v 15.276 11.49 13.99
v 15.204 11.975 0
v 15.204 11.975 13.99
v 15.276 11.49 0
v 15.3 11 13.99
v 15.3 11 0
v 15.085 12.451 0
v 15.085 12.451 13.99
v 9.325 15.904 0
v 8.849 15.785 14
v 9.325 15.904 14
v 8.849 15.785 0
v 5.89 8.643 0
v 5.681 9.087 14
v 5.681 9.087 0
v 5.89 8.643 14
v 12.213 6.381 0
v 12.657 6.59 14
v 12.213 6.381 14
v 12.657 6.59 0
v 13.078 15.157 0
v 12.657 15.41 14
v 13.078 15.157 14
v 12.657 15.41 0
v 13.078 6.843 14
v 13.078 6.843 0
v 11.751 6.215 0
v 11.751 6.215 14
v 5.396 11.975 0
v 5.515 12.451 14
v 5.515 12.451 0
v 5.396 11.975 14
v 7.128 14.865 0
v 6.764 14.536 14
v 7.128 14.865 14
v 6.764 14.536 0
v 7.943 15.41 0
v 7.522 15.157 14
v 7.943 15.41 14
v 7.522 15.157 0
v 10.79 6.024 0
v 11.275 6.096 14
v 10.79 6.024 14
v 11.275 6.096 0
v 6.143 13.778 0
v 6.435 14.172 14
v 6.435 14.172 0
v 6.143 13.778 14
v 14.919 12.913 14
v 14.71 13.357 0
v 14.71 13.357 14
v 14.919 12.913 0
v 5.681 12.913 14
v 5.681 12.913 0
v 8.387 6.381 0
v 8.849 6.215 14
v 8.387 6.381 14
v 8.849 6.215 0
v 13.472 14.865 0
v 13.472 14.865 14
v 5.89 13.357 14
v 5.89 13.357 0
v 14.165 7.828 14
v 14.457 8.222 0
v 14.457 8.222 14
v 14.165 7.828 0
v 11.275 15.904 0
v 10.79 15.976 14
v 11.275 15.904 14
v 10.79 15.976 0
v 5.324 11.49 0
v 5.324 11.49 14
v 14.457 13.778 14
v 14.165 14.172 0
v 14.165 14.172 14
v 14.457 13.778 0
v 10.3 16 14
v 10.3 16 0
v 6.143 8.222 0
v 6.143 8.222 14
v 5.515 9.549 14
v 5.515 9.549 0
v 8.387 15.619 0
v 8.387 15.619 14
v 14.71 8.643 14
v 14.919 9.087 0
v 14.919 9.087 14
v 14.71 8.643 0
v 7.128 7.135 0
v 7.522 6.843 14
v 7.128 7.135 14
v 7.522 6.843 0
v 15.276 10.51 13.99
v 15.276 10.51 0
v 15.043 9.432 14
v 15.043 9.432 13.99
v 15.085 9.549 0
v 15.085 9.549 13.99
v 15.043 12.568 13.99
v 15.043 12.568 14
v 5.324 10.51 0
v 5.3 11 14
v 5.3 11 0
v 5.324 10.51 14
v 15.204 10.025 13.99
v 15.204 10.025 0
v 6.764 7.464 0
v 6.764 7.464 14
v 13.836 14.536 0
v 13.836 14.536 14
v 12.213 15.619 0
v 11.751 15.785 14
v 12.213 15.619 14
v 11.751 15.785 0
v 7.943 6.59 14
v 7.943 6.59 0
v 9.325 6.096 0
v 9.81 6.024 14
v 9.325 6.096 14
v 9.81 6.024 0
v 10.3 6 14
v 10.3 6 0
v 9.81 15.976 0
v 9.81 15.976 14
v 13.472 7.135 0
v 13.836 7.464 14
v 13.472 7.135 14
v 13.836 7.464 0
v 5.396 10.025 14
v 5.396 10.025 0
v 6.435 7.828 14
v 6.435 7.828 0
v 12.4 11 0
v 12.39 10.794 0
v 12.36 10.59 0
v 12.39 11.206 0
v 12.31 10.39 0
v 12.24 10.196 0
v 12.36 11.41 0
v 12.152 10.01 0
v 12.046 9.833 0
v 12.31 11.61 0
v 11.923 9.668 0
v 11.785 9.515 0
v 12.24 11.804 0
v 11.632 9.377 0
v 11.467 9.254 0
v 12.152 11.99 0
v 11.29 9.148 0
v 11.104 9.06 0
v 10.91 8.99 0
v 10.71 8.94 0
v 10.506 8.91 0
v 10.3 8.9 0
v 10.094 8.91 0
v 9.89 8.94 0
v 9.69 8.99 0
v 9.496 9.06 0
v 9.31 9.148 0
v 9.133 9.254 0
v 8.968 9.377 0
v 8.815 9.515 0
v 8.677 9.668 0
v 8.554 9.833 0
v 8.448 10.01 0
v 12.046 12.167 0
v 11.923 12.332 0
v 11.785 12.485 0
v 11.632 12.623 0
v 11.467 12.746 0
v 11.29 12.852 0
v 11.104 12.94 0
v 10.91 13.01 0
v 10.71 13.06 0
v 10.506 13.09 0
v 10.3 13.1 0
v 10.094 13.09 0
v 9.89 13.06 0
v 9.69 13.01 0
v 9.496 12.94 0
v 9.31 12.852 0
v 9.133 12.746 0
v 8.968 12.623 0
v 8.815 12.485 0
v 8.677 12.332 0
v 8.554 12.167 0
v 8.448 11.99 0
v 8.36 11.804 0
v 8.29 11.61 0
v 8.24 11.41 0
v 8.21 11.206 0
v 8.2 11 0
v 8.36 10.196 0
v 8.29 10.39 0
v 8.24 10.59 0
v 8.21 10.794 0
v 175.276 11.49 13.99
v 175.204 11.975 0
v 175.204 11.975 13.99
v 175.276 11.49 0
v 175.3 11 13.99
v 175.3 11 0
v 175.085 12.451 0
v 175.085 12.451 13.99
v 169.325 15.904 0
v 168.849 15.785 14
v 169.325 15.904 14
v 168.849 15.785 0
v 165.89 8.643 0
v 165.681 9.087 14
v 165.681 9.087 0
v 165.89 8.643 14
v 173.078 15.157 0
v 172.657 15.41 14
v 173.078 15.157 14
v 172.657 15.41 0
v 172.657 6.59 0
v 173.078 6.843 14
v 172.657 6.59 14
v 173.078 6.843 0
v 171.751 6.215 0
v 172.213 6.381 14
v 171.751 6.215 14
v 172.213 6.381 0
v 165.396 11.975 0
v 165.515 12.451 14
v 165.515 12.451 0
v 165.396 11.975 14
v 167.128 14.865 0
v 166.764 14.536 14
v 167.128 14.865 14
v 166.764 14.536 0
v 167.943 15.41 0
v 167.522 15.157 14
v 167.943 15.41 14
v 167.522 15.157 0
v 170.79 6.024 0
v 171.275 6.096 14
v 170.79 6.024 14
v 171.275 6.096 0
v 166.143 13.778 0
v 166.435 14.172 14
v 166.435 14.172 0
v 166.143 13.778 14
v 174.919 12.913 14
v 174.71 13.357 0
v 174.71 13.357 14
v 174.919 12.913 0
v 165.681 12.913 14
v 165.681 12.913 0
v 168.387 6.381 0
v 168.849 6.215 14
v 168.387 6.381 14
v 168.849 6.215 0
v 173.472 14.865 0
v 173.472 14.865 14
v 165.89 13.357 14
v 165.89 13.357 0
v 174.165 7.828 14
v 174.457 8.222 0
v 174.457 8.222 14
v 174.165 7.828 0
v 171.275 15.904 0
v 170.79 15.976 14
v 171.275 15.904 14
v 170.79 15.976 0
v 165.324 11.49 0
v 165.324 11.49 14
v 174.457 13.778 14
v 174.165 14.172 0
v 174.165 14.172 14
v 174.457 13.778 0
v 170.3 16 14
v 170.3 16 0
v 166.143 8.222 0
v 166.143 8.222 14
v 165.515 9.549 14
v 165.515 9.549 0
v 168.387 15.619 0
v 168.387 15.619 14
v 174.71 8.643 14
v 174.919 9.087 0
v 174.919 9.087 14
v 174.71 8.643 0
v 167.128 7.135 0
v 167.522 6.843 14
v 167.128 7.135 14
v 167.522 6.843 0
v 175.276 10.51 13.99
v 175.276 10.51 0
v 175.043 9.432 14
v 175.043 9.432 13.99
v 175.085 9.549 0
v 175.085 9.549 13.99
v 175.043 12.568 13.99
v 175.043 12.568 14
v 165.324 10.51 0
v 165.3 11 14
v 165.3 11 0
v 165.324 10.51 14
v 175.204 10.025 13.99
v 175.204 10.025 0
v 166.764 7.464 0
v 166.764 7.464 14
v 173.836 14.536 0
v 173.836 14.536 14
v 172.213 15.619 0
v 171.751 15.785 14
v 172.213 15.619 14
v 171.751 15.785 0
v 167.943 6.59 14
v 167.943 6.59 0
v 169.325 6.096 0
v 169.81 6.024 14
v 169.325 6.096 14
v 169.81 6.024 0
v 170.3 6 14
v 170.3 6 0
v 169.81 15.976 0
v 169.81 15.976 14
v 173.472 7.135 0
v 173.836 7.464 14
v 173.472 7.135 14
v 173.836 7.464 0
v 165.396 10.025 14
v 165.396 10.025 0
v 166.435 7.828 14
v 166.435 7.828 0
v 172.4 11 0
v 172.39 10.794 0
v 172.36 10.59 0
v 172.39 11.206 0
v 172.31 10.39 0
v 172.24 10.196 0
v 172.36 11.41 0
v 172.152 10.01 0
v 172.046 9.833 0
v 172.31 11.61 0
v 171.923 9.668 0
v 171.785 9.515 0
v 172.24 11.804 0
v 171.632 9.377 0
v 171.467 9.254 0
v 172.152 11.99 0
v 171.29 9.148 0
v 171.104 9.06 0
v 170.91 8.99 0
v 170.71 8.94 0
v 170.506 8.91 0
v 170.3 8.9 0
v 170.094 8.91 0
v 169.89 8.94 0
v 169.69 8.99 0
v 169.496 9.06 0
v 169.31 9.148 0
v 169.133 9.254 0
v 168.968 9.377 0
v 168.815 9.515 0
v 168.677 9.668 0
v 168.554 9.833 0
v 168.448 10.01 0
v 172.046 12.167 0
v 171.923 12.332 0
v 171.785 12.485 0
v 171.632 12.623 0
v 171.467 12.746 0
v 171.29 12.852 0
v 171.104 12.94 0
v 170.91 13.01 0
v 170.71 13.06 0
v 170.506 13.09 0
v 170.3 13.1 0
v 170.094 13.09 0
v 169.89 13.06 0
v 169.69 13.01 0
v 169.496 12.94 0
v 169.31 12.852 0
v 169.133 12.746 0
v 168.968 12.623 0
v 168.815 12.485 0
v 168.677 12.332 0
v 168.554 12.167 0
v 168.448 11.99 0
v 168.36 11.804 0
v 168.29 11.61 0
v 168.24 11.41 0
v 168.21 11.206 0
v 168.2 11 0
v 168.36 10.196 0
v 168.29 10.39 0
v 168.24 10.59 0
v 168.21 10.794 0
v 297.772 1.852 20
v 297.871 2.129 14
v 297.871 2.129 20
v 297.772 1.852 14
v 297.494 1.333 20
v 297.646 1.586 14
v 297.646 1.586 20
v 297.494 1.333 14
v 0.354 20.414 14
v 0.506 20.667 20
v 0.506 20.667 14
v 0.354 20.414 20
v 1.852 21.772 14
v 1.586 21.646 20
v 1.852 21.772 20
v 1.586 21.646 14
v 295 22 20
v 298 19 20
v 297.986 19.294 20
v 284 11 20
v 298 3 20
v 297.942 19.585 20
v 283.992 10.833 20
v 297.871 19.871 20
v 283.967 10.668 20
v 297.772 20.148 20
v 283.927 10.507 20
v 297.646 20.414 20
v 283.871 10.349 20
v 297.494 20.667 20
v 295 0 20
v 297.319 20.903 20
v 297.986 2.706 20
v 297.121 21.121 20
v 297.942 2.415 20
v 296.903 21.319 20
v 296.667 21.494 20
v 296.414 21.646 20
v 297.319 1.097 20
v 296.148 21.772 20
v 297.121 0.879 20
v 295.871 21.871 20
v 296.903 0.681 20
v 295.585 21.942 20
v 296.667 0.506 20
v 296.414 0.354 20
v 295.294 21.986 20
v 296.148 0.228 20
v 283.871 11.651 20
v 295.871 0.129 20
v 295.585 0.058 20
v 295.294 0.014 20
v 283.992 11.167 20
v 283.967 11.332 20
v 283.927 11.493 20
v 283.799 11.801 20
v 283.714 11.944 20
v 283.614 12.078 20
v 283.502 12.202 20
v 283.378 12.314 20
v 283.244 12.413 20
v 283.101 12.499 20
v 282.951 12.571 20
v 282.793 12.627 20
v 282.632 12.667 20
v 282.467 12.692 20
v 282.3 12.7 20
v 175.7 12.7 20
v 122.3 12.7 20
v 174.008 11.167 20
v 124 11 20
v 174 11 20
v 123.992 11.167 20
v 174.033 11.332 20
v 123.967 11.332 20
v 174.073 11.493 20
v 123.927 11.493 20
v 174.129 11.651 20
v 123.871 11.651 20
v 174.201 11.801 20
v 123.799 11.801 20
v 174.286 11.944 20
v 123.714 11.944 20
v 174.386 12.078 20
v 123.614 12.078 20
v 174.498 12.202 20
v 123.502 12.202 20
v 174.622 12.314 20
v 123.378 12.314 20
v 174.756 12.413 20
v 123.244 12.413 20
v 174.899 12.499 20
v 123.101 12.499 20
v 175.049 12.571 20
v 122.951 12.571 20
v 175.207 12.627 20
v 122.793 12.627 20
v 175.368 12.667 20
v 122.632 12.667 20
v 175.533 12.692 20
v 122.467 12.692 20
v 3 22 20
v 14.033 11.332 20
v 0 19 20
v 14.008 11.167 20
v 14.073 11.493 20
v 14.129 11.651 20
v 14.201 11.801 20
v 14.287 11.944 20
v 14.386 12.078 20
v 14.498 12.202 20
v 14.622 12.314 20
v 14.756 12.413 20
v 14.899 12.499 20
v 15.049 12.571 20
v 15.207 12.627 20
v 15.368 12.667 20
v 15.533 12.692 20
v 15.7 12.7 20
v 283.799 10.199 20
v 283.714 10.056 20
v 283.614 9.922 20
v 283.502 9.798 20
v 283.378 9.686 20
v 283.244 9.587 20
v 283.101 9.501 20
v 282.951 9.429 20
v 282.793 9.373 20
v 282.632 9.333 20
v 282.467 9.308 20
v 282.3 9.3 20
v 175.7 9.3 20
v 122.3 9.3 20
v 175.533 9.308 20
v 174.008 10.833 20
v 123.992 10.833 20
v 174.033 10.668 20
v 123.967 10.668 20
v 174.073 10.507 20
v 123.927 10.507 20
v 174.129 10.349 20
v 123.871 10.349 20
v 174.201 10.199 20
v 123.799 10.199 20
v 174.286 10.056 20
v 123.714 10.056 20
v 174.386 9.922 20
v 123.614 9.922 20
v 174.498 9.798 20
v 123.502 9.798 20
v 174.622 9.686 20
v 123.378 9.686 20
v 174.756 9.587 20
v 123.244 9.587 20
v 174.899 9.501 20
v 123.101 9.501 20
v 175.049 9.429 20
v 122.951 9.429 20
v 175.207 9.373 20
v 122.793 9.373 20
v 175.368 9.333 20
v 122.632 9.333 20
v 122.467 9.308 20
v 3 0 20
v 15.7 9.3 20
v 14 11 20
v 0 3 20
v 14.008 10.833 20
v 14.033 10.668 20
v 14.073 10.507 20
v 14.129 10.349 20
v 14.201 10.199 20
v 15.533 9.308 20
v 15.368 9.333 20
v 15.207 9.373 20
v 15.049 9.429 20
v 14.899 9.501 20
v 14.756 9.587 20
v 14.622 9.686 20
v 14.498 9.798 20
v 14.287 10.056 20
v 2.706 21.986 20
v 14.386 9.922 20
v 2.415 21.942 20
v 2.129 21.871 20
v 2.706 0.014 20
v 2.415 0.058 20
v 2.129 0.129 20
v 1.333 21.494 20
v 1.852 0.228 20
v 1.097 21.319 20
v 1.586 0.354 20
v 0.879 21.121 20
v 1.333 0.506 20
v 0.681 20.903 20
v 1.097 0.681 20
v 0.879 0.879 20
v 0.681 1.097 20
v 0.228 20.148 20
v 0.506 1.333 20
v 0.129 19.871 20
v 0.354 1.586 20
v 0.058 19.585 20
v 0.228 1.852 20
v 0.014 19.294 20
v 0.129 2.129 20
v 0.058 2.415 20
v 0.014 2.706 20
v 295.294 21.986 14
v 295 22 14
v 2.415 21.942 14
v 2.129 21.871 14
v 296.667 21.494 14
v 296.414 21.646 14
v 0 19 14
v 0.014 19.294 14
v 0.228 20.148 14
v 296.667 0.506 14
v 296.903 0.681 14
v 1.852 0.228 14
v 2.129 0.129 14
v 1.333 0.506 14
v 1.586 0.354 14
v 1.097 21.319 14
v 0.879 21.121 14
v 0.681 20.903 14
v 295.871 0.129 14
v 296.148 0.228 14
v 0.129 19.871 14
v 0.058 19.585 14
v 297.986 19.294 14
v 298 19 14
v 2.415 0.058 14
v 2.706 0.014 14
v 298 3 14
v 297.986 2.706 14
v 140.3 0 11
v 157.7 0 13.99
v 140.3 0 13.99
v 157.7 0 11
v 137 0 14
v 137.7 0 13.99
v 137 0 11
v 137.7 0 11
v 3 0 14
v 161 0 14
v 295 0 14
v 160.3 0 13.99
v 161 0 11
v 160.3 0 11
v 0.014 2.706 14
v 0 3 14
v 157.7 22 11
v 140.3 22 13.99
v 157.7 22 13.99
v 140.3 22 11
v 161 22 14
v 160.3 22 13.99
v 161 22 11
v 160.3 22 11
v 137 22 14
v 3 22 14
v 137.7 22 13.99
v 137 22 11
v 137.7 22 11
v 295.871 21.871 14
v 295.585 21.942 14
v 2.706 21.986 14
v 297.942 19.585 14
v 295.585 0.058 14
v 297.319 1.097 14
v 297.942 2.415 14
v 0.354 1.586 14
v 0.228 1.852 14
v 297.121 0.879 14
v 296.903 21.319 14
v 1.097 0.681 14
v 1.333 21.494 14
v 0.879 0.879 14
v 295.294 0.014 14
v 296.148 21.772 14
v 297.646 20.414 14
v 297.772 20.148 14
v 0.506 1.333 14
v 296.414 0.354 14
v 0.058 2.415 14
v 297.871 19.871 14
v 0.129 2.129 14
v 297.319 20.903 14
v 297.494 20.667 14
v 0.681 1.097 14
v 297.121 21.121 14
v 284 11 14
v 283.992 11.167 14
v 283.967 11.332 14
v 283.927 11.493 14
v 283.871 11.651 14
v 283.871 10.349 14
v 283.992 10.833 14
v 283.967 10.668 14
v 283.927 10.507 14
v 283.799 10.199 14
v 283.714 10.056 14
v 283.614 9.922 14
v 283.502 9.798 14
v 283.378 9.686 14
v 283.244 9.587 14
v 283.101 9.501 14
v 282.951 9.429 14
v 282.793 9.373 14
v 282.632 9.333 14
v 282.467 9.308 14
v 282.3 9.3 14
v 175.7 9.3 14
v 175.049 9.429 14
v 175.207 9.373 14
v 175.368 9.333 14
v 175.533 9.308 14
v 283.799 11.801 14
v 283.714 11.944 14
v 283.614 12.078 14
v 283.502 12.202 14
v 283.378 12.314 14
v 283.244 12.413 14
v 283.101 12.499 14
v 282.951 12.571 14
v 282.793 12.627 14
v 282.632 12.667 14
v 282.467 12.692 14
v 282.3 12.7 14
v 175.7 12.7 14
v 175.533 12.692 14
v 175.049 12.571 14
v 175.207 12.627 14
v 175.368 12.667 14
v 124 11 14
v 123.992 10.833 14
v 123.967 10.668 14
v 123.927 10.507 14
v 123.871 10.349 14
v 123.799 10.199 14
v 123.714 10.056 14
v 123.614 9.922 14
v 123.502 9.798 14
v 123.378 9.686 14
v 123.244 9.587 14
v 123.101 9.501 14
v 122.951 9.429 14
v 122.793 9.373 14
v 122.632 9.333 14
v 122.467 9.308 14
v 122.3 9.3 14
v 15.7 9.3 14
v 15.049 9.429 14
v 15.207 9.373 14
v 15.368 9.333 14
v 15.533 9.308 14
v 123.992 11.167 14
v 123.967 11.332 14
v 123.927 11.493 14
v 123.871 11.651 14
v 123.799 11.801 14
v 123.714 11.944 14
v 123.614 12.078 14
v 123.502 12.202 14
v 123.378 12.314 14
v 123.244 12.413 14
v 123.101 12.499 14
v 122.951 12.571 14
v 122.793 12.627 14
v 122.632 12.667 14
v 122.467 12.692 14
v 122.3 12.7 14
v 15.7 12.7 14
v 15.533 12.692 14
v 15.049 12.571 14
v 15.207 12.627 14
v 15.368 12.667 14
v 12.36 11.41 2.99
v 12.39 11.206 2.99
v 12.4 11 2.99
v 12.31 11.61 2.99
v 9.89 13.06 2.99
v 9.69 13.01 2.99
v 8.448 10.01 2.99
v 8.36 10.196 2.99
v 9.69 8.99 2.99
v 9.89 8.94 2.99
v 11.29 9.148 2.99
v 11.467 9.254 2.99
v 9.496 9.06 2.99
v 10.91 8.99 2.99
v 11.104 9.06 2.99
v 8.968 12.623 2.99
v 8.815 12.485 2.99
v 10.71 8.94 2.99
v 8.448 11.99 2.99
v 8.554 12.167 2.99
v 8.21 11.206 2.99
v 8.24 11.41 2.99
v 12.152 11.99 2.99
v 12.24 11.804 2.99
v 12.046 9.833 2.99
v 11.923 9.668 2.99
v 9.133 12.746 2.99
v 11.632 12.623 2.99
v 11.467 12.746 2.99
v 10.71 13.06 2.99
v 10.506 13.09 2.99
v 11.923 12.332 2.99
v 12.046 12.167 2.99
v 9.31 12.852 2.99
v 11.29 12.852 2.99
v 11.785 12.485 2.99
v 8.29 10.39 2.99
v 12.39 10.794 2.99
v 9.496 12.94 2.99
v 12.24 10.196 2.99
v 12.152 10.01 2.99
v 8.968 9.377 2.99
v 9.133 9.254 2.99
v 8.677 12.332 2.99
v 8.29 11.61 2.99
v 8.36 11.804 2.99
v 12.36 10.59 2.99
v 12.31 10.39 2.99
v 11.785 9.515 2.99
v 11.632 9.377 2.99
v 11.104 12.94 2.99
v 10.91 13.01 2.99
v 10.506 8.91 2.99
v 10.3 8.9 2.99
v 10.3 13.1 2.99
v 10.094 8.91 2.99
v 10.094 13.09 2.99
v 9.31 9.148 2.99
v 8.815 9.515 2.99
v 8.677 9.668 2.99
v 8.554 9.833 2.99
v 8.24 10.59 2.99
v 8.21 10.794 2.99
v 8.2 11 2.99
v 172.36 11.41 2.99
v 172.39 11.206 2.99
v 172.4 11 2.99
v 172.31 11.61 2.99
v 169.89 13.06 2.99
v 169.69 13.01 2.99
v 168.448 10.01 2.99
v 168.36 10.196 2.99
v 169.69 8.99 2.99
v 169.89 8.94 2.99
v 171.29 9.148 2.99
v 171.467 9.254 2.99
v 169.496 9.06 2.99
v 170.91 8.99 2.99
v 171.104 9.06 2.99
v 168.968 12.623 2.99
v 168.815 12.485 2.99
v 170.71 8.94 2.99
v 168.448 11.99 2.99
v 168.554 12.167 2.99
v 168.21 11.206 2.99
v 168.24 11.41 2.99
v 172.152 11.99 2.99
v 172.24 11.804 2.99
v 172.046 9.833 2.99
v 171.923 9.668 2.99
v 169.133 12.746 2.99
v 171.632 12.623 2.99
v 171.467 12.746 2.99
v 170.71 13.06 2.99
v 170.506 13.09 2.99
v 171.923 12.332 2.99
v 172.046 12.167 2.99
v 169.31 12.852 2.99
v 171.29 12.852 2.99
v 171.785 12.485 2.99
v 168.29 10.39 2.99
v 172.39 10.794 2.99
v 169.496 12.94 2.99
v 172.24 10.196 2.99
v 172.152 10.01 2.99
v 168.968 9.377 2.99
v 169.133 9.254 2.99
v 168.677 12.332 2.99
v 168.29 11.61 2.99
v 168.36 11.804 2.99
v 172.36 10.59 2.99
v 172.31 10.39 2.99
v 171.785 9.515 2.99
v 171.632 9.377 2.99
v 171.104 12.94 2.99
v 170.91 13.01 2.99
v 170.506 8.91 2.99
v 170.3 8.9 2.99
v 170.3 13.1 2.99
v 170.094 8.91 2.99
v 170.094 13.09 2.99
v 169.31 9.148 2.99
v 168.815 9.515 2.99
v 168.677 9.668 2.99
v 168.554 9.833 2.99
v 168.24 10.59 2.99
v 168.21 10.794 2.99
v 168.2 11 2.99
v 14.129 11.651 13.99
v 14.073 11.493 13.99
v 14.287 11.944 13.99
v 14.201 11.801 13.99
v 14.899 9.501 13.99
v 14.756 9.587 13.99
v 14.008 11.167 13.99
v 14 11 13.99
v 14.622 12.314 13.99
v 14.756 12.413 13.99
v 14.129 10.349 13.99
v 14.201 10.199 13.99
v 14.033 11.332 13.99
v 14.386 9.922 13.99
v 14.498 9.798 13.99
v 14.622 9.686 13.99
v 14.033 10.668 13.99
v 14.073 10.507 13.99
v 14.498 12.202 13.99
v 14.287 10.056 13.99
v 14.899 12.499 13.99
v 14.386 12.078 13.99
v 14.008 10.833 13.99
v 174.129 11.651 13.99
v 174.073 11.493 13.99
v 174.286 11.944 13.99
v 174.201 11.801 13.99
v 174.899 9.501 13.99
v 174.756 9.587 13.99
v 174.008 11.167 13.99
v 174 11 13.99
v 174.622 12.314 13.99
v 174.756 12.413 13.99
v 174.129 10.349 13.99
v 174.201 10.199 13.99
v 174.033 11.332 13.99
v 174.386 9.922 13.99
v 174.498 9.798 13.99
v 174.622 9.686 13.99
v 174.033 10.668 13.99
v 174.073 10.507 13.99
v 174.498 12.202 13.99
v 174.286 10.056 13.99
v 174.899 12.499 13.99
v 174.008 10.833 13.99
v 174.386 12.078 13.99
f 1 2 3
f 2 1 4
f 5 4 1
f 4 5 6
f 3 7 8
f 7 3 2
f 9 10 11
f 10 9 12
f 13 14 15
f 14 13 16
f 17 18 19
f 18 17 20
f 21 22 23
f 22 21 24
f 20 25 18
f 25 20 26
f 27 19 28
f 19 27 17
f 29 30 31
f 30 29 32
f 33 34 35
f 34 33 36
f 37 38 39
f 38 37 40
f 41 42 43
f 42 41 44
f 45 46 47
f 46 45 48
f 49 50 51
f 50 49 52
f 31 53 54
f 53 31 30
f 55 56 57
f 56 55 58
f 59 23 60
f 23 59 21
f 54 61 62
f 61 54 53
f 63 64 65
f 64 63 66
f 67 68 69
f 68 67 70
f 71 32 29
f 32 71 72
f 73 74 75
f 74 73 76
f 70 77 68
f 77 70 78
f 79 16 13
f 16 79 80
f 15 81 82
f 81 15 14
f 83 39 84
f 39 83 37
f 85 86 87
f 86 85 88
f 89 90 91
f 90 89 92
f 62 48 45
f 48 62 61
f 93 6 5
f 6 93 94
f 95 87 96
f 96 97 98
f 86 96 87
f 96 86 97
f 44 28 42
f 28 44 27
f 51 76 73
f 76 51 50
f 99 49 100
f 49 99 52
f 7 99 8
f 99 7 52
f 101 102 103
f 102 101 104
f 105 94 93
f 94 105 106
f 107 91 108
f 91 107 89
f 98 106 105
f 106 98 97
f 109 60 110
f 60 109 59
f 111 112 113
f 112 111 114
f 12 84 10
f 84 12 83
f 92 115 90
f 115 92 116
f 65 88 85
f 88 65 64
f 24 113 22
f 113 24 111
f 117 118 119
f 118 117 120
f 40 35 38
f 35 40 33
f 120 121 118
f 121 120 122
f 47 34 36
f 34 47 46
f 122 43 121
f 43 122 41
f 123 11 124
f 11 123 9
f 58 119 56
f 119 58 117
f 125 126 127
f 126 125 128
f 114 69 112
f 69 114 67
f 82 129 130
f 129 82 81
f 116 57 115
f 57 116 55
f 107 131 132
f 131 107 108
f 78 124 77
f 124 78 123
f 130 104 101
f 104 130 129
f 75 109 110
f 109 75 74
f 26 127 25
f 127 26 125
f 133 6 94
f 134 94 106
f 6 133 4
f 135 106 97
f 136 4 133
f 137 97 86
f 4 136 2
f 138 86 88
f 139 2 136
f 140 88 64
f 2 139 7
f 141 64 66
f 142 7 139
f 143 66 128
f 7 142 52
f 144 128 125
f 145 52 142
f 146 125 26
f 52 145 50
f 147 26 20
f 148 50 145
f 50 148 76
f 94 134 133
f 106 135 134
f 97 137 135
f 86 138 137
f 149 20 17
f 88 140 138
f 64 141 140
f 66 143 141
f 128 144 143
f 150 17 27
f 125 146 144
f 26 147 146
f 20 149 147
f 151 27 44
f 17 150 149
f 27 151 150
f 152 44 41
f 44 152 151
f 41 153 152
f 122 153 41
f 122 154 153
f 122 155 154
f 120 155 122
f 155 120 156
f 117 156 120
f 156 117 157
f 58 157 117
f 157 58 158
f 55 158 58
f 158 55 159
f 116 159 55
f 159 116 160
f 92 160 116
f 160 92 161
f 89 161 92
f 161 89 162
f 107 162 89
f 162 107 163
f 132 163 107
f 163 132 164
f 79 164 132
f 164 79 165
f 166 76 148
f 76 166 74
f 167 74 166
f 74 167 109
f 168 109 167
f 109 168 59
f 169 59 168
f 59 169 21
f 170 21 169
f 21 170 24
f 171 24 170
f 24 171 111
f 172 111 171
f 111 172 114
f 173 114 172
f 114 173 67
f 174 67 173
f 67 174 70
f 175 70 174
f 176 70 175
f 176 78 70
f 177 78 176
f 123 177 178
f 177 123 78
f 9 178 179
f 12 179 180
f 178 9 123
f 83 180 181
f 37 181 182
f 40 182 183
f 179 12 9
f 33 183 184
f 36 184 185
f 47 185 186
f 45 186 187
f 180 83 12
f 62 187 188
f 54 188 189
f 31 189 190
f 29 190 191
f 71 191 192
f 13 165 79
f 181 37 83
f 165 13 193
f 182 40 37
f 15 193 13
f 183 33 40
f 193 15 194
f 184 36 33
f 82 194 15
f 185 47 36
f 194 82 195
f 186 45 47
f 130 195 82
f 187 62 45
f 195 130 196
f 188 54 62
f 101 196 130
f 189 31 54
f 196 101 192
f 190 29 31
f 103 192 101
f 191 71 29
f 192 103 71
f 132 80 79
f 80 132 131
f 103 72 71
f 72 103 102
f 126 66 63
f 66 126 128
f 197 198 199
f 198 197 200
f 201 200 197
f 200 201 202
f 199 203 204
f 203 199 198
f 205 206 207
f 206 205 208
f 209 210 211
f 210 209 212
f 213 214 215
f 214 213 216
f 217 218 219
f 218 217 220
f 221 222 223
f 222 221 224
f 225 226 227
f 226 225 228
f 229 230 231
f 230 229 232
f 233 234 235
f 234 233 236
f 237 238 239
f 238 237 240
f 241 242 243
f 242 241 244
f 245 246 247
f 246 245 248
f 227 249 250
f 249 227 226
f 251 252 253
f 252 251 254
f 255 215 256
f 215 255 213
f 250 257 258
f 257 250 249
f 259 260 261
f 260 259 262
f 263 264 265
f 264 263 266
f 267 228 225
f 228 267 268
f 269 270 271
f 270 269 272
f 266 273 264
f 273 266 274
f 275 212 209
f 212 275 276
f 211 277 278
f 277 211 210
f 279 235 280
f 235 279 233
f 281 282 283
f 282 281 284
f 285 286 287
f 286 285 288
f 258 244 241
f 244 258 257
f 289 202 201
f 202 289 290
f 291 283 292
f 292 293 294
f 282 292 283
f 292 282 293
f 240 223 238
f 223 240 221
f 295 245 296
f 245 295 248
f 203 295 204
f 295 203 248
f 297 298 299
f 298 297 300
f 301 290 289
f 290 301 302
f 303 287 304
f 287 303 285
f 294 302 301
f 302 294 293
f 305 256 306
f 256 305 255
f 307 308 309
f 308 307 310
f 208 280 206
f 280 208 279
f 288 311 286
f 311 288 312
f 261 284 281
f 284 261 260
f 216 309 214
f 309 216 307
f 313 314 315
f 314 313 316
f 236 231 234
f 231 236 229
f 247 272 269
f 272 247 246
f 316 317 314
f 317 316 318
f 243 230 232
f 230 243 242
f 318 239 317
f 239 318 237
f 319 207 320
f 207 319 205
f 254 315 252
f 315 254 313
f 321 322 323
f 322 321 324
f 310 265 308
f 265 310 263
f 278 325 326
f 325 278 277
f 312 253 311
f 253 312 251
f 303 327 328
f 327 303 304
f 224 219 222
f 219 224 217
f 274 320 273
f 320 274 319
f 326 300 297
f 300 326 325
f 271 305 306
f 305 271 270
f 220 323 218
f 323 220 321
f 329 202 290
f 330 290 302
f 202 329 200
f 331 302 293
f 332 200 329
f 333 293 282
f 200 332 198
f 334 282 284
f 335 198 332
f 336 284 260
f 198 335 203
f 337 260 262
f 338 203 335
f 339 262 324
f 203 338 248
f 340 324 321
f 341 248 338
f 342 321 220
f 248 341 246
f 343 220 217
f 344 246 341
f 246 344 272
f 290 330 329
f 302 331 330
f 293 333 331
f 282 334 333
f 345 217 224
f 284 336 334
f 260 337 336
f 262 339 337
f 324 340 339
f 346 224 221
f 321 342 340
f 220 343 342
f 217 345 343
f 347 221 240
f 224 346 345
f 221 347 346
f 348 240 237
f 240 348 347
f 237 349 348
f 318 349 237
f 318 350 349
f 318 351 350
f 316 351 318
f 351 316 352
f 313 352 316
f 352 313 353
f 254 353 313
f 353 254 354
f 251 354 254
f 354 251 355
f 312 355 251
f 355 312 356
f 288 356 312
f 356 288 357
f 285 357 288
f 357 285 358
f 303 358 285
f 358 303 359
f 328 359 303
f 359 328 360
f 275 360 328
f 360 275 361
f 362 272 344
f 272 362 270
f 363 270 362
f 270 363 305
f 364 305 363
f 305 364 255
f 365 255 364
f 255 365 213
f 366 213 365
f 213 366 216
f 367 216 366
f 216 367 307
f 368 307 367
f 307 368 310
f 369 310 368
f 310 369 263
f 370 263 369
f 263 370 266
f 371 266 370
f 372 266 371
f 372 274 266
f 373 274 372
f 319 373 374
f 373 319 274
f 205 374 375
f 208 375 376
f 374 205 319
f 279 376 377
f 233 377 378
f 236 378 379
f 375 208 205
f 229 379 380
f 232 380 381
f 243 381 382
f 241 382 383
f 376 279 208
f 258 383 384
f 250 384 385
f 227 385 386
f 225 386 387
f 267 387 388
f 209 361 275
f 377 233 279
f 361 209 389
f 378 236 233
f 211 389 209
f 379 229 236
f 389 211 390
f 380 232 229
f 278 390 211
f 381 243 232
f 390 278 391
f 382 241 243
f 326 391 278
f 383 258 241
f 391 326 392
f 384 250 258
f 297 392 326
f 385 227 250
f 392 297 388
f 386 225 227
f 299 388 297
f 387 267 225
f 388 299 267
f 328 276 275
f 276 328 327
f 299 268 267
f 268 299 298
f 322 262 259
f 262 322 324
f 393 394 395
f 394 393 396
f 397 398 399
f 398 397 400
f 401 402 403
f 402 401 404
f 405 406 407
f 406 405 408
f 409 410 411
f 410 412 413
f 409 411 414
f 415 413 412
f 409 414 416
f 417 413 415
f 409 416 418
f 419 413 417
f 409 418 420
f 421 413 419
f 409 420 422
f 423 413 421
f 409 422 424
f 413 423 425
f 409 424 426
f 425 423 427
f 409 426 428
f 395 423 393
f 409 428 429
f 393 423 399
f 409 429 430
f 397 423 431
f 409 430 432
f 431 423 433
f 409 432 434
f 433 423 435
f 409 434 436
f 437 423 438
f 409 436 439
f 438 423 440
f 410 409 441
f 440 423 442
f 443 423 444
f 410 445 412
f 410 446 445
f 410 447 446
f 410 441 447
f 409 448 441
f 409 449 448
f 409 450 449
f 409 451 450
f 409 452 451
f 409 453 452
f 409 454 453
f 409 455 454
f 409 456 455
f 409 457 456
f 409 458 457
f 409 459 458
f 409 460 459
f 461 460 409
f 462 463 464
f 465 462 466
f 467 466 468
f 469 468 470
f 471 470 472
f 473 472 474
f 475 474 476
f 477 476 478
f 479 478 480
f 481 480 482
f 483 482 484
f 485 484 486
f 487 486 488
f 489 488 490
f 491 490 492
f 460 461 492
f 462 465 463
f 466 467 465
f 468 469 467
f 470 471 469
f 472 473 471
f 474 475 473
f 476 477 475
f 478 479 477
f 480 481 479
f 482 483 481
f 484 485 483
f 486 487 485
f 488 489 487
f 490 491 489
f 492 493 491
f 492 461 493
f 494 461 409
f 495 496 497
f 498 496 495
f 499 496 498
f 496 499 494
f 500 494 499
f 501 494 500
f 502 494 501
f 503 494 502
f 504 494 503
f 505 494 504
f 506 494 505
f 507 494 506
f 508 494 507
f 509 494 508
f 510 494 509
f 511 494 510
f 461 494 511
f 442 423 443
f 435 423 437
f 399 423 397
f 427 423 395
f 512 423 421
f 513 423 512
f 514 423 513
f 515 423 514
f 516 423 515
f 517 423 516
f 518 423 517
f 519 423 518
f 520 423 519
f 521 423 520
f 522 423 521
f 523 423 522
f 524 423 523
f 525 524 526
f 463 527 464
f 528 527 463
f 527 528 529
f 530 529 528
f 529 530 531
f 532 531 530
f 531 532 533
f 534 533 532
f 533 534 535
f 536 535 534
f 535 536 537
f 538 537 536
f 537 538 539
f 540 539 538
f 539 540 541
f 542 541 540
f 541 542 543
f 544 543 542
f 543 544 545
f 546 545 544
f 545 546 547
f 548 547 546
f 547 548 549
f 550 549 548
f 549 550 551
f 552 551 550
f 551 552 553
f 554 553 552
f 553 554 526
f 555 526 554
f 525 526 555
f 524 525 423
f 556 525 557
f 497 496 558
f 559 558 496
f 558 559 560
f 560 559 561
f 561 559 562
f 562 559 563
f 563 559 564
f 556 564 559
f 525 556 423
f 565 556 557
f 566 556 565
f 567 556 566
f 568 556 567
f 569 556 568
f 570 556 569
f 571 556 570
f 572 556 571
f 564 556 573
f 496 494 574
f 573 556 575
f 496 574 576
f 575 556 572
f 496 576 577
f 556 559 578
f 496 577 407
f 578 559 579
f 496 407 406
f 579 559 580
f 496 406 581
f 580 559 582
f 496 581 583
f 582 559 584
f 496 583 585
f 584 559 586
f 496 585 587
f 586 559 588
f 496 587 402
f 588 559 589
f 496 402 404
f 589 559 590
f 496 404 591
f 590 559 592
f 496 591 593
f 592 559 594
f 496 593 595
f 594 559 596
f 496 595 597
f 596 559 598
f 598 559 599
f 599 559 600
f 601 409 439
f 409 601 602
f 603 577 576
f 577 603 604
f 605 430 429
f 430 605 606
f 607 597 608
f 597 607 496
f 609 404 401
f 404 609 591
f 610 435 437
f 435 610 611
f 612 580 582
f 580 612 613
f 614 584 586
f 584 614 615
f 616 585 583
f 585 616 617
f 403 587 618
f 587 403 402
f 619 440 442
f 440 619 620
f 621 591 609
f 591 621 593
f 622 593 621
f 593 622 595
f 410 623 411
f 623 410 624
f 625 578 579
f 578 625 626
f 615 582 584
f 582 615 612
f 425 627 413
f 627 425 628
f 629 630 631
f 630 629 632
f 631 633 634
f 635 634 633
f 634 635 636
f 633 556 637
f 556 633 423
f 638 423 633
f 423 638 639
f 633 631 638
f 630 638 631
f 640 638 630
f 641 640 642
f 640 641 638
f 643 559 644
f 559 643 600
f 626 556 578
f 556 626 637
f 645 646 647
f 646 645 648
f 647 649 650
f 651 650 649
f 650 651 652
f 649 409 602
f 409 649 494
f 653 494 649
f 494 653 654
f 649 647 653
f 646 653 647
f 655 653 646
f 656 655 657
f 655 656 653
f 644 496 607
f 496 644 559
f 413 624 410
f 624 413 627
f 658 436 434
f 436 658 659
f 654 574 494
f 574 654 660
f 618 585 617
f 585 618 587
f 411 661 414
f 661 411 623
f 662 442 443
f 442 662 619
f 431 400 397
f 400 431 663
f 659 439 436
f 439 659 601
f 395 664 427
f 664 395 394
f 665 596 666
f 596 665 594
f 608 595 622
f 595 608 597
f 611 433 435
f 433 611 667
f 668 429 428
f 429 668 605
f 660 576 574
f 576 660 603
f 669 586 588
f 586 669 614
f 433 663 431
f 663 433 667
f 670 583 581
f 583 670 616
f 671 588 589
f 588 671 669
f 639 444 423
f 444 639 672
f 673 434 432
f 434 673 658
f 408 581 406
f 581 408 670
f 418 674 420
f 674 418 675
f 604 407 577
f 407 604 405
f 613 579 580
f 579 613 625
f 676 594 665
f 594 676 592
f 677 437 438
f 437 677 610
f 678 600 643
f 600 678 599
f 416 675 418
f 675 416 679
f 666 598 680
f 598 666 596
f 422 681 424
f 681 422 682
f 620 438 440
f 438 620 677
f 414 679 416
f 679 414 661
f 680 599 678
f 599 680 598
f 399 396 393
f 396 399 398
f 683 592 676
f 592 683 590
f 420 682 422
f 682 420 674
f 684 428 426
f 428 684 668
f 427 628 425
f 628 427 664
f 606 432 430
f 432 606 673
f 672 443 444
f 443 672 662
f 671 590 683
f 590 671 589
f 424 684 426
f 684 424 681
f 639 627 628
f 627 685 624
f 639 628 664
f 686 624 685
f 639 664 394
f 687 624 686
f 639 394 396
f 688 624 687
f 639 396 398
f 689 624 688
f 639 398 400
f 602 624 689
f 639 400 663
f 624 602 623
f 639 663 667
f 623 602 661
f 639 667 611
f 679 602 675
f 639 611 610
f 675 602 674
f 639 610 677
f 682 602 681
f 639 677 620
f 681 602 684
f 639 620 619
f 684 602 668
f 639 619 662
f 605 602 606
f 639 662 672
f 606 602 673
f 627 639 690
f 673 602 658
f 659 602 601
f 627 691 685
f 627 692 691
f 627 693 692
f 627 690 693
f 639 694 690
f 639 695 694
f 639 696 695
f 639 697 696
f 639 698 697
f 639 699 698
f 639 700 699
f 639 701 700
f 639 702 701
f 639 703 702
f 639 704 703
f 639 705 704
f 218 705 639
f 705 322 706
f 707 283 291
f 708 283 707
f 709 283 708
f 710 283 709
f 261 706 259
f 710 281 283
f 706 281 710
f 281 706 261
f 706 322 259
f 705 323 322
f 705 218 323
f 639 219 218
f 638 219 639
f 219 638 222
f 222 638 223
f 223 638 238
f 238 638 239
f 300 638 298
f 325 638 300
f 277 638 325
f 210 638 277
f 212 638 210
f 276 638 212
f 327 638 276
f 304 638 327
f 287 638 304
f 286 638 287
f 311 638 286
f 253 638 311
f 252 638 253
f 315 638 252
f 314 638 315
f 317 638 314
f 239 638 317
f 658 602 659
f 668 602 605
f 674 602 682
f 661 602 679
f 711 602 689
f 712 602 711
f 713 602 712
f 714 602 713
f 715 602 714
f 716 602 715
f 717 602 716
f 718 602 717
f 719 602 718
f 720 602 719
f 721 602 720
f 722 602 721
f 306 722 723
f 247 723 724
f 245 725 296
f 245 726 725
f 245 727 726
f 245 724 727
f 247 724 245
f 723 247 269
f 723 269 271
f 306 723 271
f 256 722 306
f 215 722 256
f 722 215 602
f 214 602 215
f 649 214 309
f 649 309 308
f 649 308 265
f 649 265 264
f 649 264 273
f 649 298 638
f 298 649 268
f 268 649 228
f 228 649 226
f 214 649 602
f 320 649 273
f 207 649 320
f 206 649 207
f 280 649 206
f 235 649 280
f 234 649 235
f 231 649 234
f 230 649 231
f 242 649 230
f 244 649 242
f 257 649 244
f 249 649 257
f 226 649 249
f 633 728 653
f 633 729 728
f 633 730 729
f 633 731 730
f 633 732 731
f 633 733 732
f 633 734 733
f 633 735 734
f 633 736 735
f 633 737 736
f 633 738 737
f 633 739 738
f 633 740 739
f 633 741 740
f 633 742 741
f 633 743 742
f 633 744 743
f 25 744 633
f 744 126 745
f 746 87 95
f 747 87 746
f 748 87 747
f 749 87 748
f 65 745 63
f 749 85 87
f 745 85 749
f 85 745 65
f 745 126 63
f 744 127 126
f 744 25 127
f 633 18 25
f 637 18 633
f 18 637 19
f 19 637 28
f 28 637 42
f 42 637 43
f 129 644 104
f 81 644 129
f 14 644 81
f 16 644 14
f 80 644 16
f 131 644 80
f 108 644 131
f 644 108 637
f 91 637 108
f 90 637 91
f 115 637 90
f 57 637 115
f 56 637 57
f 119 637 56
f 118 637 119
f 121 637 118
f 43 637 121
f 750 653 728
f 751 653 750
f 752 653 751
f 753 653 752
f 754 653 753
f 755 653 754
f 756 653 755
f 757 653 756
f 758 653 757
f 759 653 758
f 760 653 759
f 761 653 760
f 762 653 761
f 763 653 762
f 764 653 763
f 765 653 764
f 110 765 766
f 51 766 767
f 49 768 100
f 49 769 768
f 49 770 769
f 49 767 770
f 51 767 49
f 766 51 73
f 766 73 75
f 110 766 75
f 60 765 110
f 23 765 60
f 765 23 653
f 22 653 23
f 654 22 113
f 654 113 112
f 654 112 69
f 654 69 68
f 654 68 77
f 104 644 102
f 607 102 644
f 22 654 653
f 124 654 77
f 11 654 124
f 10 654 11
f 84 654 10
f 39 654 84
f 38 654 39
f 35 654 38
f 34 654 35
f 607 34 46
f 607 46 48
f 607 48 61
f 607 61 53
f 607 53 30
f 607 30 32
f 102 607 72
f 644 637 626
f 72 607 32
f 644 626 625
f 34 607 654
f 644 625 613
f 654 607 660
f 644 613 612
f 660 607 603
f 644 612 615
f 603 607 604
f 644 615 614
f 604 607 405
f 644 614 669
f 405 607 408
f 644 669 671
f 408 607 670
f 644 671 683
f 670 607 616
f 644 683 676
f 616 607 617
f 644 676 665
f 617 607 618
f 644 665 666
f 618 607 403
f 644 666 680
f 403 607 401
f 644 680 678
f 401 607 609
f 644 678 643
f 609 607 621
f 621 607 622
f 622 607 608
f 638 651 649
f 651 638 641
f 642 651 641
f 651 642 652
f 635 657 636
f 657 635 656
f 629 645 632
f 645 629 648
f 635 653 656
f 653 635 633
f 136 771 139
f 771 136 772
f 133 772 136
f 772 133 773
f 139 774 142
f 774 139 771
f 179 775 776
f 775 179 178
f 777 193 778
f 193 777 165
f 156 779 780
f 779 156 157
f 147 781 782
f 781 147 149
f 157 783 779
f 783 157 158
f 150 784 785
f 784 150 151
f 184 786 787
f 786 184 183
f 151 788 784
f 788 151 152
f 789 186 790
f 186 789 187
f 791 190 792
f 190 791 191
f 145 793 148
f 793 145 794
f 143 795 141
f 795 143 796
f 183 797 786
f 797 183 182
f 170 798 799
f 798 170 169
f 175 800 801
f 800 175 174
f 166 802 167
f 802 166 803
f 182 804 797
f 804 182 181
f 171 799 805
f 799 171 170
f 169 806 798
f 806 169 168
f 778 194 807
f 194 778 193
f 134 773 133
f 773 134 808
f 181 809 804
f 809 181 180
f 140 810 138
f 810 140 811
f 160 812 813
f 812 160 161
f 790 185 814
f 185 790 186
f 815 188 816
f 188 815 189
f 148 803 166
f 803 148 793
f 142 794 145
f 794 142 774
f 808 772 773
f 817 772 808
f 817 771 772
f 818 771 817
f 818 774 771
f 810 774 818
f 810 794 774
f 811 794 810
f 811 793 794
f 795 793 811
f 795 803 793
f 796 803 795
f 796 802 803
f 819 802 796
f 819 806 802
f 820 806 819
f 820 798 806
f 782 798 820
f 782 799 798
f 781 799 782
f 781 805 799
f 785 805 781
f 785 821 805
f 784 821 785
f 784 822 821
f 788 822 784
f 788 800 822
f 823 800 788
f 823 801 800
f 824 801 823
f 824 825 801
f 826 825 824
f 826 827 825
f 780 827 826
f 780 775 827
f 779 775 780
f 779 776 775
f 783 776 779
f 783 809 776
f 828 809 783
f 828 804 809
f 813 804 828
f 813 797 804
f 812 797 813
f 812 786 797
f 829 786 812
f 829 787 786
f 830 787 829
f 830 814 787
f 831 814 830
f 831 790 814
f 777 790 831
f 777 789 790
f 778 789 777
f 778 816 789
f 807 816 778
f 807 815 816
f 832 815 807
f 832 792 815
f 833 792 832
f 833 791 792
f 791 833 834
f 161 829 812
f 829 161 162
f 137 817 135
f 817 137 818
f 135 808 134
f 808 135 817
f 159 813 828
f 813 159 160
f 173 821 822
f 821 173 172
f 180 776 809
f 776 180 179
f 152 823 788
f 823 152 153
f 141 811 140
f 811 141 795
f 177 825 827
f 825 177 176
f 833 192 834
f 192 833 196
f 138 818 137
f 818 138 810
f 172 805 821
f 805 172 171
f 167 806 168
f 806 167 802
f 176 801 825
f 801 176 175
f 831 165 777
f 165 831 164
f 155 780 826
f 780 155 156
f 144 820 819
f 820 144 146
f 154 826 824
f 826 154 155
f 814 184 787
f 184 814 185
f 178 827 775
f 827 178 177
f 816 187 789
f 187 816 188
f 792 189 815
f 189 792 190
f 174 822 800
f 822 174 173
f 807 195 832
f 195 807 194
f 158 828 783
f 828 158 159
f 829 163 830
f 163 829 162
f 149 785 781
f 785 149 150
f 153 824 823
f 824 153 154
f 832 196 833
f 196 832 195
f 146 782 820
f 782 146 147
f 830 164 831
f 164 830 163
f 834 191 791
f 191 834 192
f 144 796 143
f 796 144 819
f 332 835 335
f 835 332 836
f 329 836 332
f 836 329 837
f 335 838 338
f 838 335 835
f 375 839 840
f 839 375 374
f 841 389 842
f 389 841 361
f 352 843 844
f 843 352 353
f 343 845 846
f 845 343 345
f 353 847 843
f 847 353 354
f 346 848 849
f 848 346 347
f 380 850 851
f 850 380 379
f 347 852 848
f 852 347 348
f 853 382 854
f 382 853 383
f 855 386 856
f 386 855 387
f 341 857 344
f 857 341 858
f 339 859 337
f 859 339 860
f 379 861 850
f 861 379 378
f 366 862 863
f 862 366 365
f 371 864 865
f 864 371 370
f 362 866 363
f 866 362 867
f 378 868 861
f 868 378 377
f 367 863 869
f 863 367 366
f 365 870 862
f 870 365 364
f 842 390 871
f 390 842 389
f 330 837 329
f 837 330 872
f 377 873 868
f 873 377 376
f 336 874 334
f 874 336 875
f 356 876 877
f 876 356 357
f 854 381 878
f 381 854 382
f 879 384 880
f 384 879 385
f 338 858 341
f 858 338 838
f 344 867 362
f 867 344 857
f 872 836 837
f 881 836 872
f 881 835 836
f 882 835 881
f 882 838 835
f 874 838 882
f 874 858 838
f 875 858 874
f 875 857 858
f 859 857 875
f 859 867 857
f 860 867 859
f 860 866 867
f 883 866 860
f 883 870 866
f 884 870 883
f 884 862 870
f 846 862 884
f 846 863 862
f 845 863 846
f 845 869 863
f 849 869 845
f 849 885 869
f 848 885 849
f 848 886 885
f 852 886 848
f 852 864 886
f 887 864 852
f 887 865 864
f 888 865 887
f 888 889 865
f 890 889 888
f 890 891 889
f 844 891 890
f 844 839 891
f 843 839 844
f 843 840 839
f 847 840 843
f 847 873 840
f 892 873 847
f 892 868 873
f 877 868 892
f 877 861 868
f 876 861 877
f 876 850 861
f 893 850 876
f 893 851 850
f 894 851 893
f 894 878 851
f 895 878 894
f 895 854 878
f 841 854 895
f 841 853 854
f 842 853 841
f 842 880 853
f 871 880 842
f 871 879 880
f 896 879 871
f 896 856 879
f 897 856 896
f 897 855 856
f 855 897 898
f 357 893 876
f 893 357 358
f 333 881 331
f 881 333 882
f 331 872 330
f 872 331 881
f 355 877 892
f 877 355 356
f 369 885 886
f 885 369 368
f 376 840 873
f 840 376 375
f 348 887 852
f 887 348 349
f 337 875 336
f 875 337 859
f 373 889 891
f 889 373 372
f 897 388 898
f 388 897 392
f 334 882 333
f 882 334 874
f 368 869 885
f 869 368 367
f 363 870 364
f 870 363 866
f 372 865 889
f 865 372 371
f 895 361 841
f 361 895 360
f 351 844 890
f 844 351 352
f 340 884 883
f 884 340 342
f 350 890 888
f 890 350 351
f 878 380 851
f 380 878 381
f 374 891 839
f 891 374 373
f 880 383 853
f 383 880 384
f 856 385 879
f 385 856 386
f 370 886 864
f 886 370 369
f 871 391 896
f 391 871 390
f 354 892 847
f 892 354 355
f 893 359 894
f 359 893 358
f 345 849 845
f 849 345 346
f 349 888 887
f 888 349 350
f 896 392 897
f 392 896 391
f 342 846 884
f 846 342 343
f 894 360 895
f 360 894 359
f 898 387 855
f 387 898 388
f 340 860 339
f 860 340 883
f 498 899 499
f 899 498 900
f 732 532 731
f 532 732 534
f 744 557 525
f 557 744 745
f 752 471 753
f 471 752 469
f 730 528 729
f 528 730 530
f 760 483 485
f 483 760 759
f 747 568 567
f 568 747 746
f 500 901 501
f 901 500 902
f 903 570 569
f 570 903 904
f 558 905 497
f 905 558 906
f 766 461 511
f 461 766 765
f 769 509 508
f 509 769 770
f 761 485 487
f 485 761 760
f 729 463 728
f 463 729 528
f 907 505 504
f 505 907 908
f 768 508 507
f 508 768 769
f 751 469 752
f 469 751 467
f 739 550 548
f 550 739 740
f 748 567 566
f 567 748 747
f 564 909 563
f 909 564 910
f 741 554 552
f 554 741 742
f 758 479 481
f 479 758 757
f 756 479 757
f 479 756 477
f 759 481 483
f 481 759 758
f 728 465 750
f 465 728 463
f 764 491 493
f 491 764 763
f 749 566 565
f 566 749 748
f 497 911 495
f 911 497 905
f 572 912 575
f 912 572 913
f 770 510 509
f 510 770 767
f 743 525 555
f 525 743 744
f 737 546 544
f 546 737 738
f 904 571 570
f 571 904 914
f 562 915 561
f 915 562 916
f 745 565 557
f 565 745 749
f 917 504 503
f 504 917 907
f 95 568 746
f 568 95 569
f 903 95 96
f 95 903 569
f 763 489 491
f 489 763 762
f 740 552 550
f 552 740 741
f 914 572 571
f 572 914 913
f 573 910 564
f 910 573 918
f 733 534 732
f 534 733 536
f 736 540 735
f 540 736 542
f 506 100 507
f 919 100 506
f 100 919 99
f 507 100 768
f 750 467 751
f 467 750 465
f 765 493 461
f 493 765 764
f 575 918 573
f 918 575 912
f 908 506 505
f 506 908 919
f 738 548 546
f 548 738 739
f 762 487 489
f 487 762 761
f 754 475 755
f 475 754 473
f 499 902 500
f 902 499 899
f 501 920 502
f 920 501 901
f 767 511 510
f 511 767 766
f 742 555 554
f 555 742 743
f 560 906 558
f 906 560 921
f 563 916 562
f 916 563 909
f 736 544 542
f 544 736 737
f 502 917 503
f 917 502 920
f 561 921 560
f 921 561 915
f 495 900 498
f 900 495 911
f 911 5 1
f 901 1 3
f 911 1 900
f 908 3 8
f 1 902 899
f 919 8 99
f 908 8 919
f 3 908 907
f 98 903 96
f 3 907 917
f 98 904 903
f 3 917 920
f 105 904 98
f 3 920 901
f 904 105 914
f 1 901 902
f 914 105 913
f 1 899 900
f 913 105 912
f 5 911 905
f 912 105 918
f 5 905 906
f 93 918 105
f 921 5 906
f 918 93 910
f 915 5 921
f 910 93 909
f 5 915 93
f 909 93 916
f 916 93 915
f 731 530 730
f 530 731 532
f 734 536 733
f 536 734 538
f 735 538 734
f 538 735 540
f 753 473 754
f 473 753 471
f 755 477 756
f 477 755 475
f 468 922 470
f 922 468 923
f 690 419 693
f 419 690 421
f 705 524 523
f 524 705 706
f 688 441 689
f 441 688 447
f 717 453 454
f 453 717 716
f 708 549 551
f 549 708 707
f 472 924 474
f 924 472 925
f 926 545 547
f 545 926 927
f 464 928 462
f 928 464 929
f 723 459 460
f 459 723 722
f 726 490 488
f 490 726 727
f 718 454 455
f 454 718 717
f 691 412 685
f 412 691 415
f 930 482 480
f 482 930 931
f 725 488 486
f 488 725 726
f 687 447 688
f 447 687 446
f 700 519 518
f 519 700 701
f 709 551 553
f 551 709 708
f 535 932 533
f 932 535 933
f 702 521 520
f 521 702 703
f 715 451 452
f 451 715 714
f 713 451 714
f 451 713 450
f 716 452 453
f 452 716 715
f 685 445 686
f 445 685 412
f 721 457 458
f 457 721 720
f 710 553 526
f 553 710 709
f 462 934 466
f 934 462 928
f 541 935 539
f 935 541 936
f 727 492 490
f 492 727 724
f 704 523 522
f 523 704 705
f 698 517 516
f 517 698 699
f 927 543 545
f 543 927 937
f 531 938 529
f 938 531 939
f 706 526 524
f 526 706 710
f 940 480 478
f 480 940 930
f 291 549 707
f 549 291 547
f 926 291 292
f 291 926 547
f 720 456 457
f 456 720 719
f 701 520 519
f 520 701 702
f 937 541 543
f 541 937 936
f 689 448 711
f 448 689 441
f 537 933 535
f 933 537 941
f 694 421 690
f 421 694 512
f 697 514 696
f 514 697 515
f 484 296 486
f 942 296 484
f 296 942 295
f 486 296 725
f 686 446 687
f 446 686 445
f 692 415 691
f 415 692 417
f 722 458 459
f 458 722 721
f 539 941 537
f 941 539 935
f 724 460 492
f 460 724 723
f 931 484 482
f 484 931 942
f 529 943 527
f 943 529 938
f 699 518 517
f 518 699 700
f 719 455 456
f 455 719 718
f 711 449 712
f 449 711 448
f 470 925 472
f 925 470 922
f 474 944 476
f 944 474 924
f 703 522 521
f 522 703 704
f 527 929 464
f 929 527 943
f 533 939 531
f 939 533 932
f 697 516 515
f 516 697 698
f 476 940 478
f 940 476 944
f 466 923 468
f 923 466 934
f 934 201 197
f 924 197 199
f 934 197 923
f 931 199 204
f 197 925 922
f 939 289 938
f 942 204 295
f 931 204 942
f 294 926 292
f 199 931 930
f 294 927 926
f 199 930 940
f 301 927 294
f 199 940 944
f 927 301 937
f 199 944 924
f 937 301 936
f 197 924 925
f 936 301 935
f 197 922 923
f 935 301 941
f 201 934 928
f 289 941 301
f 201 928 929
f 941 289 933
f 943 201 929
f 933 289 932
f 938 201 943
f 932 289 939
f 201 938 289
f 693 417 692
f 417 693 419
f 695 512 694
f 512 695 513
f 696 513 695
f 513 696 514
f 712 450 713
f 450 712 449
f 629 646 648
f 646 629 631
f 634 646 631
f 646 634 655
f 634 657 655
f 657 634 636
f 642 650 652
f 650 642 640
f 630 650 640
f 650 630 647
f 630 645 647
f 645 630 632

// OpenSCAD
// file: ../generated/config.scad
// GENERATED by tools/build.py from config/rack.yaml — do not edit.

FRAME_PROFILE = 20;
FRAME_W = 700;
FRAME_D = 225;
FRAME_TILT = 20;
FRAME_ROW_Y0 = 25;
FRAME_BRACKET = 10;
FRAME_INNER_X0 = 30;
FRAME_BASE_H = 80;
FRAME_FOOT_H = 10;
FRAME_TOP_Z = 760;
ROW_IDS = ["A", "B", "C", "D"];
ROW_HEIGHTS = [165, 165, 165, 185];
ROW_LAYOUTS = [[1, 1, 1, 1], [1, 1, 1, 1], [1, 1, 1, 1], [2, 2]];
BAY_PITCH = 160;
BAY_GAP = 2;
CARRIER_W = 158;
CARRIER_D = 210;
CARRIER_BOTTOM = 2.5;
CARRIER_WALL = 2;
CARRIER_STANDOFF = 5;
CARRIER_DECK = 3;
CARRIER_FASCIA = 2.5;
CARRIER_WALL_H = 20.1;
CARRIER_PLENUM = 23.1;
PCB_TO_FLOOR = 14;
CAM_MOUNT = [100, 60, 30];
DRAWER_D = 196;
DRAWER_W = 142;
DRAWER_X0 = 8;
DRAWER_TRAVEL = 140;
DRAWER_GUIDE_W = 7.5;
DRAWER_CLEAR = 0.5;
DRAWER_BOTTOM = 2.5;
DRAWER_WALL = 2;
DRAWER_WALL_H = 16;
DRAWER_FRONT_H = 30;
DRAWER_FRONT_T = 4;
DRAWER_REAR_BAY = 30;
DRAWER_FLANGE = [3, 3];
DRAWER_MAGNET = [6, 3];
PLATE_T = 2.5;
CHAIN_INNER = [7, 7];
CHAIN_OUTER = [11, 10];
CHAIN_R = 18;
CHAIN_FIXED = [104, 90];
CHAIN_MOVING_X = 140;
CHAIN_FOOT_Y = 172;
CHAIN_BEND_Y = 182;
NODE_SIZE = [64, 80];
NODE_T = 1.6;
NODE_HOLES = [[3.5, 3.5], [60.5, 3.5], [3.5, 76.5], [60.5, 76.5]];
NODE_X0 = 4;
NODE_FRONT_Y = 3;
NODE_PCB_TOP = 9.1;
NODE_FRONT = [32, 12, 50];
NODE_VH_Y = 64;
NODE_RIGHT = [24, 40];
NODE_CAM = [64, 11];
HUB_SIZE = [120, 70];
HUB_HOLES = [[4, 4], [116, 4], [4, 66], [116, 66]];
// file: ../lib/common.scad
// Shared helpers for every printed part of hw-testing-rack.
include <../generated/config.scad>

$fn = $preview ? 32 : 64;
EPS = 0.01;

// Heat-set inserts (Ruthex-style).  Hole Ø is the recommended pre-hole.
INSERT_M3 = [4.0, 5.7];    // [hole Ø, depth]
INSERT_M2 = [3.2, 4.0];
INSERT_M25 = [3.6, 4.5];
M3_CLEAR = 3.4;
M5_CLEAR = 5.5;
M3_HEAD = [6.0, 3.0];      // DIN 912 / ISO 7380 head Ø × height (button head ~5.7)

module rbox(size, r = 2, center = false) {
    // Box with rounded vertical edges.
    translate(center ? [-size[0] / 2, -size[1] / 2, 0] : [0, 0, 0])
        hull() for (x = [r, size[0] - r], y = [r, size[1] - r])
            translate([x, y, 0]) cylinder(r = r, h = size[2]);
}

module rslot(len, w, h) {
    // Stadium-shaped slot along X, centred on the origin.
    hull() for (x = [-(len - w) / 2, (len - w) / 2]) translate([x, 0, 0]) cylinder(d = w, h = h);
}

module insert_hole(spec = INSERT_M3) {
    // Pocket for a heat-set insert, opening at z=0 and going -Z.
    translate([0, 0, -spec[1]]) cylinder(d = spec[0], h = spec[1] + EPS);
    translate([0, 0, -0.6]) cylinder(d1 = spec[0], d2 = spec[0] + 0.8, h = 0.6 + EPS);
}

module screw_through(d = M3_CLEAR, h = 20, head = M3_HEAD, counterbore = true) {
    // Clearance hole along +Z from z=0, with an optional counterbore at z=h.
    translate([0, 0, -EPS]) cylinder(d = d, h = h + 2 * EPS);
    if (counterbore) translate([0, 0, h - head[1]]) cylinder(d = head[0] + 0.4, h = head[1] + EPS);
}

module magnet_pocket(d = DRAWER_MAGNET[0], t = DRAWER_MAGNET[1]) {
    // Press-fit/glue pocket for a disc magnet, opening at z=0 going -Z.
    translate([0, 0, -t - 0.2]) cylinder(d = d + 0.25, h = t + 0.2 + EPS);
}

module label_text(txt, size = 6, depth = 0.6, font = "Liberation Sans:style=Bold") {
    linear_extrude(depth) text(txt, size = size, font = font, halign = "center", valign = "center");
}

// 2020 B-type profile, simplified (good enough for previews and clearance checks).
module extrusion2020(len) {
    s = FRAME_PROFILE;
    difference() {
        translate([-s / 2, -s / 2, 0]) cube([s, s, len]);
        for (a = [0, 90, 180, 270]) rotate([0, 0, a])
            translate([s / 2 - 1.8, -3, -EPS]) {
                cube([1.8 + EPS, 6, len + 2 * EPS]);
                translate([-4.2, -2.6, 0]) cube([4.3, 11.2, len + 2 * EPS]);
            }
        translate([0, 0, -EPS]) cylinder(d = 4.2, h = len + 2 * EPS);
    }
}
// file: ../lib/carrier.scad
// Geometry shared by the carrier, deck, drawer, plates, chain parts and the assembly.
// All positions are in CARRIER coordinates (origin = front-left-bottom of one
// bay's carrier, X right, Y towards the back, Z up) unless stated otherwise.
include <common.scad>

WALL = CARRIER_WALL;
BOSS_D = 7.5;

// ---------------------------------------------------------------- bay node PCB
// KiCad coordinates on the node (y = 0 at the REAR edge) → carrier XY.
function node_xy(k) = [NODE_X0 + k[0], NODE_FRONT_Y + (NODE_SIZE[1] - k[1])];
NODE_REAR_Y = NODE_FRONT_Y + NODE_SIZE[1];
VH_NOTCH_Y = node_xy([0, NODE_VH_Y])[1];

// ---------------------------------------------------------------- deck fixings
// Side screws go guide → deck → base wall boss (one screw holds all three).
GUIDE_SCREW_X = 2.8;
function side_screws() = [for (y = [30, 105, 185]) for (x = [GUIDE_SCREW_X, CARRIER_W - GUIDE_SCREW_X]) [x, y]];
// Free-standing pillars under the deck middle (clear of the node and the chain).
function deck_pillars() = [[40, 165], [82, 165], [125, 75]];

// ---------------------------------------------------------------- drawer & guides
DRAWER_Y0 = 0;                                     // closed drawer front face
DRAWER_INNER_W = DRAWER_W - 2 * DRAWER_WALL;
DRAWER_PORT_WALL_Y = DRAWER_D - DRAWER_REAR_BAY;   // inner wall carrying the USB-C ports (drawer coords)
GUIDE_Y0 = DRAWER_FRONT_T + 1;
GUIDE_LIP_Z = DRAWER_FLANGE[1] + 0.4;              // lip underside above the deck
GUIDE_LIP_T = 2.0;
GUIDE_WALL_T = DRAWER_X0 - DRAWER_FLANGE[0] - 0.5;  // solid wall of the C-channel (inner face 0.5 from the flange)
STOP_PIN_X = DRAWER_X0 - DRAWER_FLANGE[0] / 2 - 0.2; // M2.5 stop screw, in the flange path
FLANGE_Y = [DRAWER_D - 26, DRAWER_D - 6];          // rear flange segment (drawer coords)
STOP_Y = FLANGE_Y[0] - DRAWER_TRAVEL - 4.5;        // stop pin position (carrier coords)
DETENT_DRAWER = [22, DRAWER_D - 14];               // magnet in drawer bottom (drawer coords)
DETENT_DECK = [DRAWER_X0 + DETENT_DRAWER[0], DETENT_DRAWER[1]];

// panel-mount USB-C (DATA) and a slot for the optional AUX (JST-SH) pigtail, on the port wall
PORT_X = [DRAWER_W * 0.38, DRAWER_W * 0.62];       // [DATA, AUX]
PORT_Z = DRAWER_BOTTOM + 7;
PORT_EARS = 26;                                    // M3 ear pitch of common panel-mount USB-C extensions

// drawer width for a bay spanning `span` units (wide bays share the node of their left unit)
function drawer_w(span) = span * BAY_PITCH - BAY_GAP - 2 * DRAWER_GUIDE_W - 2 * DRAWER_CLEAR;

// board plate (drops into the drawer between front panel and port wall)
function plate_w(span) = drawer_w(span) - 2 * DRAWER_WALL - 0.6;
PLATE_W = DRAWER_INNER_W - 0.6;
PLATE_D = DRAWER_PORT_WALL_Y - DRAWER_FRONT_T - 0.6;
PLATE_X0 = DRAWER_WALL + 0.3;                      // drawer coords
PLATE_Y0 = DRAWER_FRONT_T + 0.3;
function plate_pins() = [[10, 10], [PLATE_W - 10, PLATE_D - 10]];   // 180°-symmetric locating pins

// ---------------------------------------------------------------- drag chain
CHAIN_W = CHAIN_OUTER[0];                          // vertical extent when lying flat
CHAIN_H = CHAIN_OUTER[1];                          // horizontal extent (X) of one run
CHAIN_Z = CARRIER_BOTTOM + CHAIN_W / 2 + 0.6;      // centre line height in the plenum
CHAIN_FIXED_RUN_X = CHAIN_FIXED[0];
DECK_SLOT = [CHAIN_MOVING_X, CHAIN_FOOT_Y - DRAWER_TRAVEL - 7, CHAIN_FOOT_Y + 7];  // x, y0, y1
FOOT_HOLE = [CHAIN_MOVING_X - DRAWER_X0, CHAIN_FOOT_Y];                           // drawer coords

// ---------------------------------------------------------------- camera pod
CAM_CENTER = [CAM_MOUNT[0], CAM_MOUNT[1]];
function cam_inserts() = [for (x = [-1, 1], y = [-1, 1]) CAM_CENTER + [x, y] * CAM_MOUNT[2] / 2];
CAM_CABLE_HOLE = node_xy(NODE_CAM) + [7, 0];          // camera 5 V lead goes down here
// main file
// Bridge bar — turns two neighbouring standard drawers into one double-width
// drawer for big EVKs (i.MX RT1170 / i.MX 8M-class boards).
//
// A double bay is just two standard bays side by side: two carriers, two
// drawers, two drag chains and one or two bay nodes (the second node gives
// the EVK its second USB cable — debug + power/OTG).  Two bridge bars, front
// and rear, sit on the drawers' walls, drop onto the drawers' plate pins and
// lock the two drawers together so they slide as one.  The EVK screws onto
// standard M3 standoffs anywhere along the bars' slots.
// Length ≈ 296 mm: print diagonally on a 250 × 210 bed. PETG, 4 walls.
include <../lib/carrier.scad>

PRINT = false;                                 // true: upside down for printing
BAR_W = 22;
BAR_T = 6;
// span from the left drawer's inner left wall to the right drawer's inner right wall
BAR_L = BAY_PITCH + DRAWER_INNER_W;
LEG_H = DRAWER_WALL_H - DRAWER_BOTTOM + 0.5;   // legs reach down to the drawer bottoms
// the two plate pins this bar drops onto (bar coordinates, x from the left inner wall)
PIN_DX = [plate_pins()[0][0] + 0.3, BAY_PITCH + plate_pins()[0][0] + 0.3];

module bridge_bar() {
    difference() {
        union() {
            translate([0, 0, LEG_H]) rbox([BAR_L, BAR_W, BAR_T], r = 3);
            for (x = PIN_DX) translate([x, BAR_W / 2, 0]) cylinder(d = 10, h = LEG_H + 0.1);
            // straddles the two adjacent drawer walls in the middle
            translate([DRAWER_INNER_W - 1, 0, LEG_H - 3]) cube([BAY_PITCH - DRAWER_INNER_W + 2, BAR_W, 3.1]);
        }
        for (x = PIN_DX) translate([x, BAR_W / 2, -EPS]) cylinder(d = 4.2, h = 3);
        // the drawers' walls pass through notches in the centre block
        translate([DRAWER_INNER_W - 0.3, -EPS, LEG_H - 3 - EPS]) cube([DRAWER_WALL + 0.6, BAR_W + 2 * EPS, 3]);
        translate([BAY_PITCH - DRAWER_WALL - 0.3, -EPS, LEG_H - 3 - EPS]) cube([DRAWER_WALL + 0.6, BAR_W + 2 * EPS, 3]);
        // M3 standoff slots along the bar
        for (seg = [[14, DRAWER_INNER_W - 14], [BAY_PITCH + 14, BAR_L - 14]])
            translate([(seg[0] + seg[1]) / 2, BAR_W / 2, LEG_H - EPS]) rslot(seg[1] - seg[0], M3_CLEAR, BAR_T + 1);
    }
}

if (PRINT) rotate([180, 0, 0]) bridge_bar(); else bridge_bar();
